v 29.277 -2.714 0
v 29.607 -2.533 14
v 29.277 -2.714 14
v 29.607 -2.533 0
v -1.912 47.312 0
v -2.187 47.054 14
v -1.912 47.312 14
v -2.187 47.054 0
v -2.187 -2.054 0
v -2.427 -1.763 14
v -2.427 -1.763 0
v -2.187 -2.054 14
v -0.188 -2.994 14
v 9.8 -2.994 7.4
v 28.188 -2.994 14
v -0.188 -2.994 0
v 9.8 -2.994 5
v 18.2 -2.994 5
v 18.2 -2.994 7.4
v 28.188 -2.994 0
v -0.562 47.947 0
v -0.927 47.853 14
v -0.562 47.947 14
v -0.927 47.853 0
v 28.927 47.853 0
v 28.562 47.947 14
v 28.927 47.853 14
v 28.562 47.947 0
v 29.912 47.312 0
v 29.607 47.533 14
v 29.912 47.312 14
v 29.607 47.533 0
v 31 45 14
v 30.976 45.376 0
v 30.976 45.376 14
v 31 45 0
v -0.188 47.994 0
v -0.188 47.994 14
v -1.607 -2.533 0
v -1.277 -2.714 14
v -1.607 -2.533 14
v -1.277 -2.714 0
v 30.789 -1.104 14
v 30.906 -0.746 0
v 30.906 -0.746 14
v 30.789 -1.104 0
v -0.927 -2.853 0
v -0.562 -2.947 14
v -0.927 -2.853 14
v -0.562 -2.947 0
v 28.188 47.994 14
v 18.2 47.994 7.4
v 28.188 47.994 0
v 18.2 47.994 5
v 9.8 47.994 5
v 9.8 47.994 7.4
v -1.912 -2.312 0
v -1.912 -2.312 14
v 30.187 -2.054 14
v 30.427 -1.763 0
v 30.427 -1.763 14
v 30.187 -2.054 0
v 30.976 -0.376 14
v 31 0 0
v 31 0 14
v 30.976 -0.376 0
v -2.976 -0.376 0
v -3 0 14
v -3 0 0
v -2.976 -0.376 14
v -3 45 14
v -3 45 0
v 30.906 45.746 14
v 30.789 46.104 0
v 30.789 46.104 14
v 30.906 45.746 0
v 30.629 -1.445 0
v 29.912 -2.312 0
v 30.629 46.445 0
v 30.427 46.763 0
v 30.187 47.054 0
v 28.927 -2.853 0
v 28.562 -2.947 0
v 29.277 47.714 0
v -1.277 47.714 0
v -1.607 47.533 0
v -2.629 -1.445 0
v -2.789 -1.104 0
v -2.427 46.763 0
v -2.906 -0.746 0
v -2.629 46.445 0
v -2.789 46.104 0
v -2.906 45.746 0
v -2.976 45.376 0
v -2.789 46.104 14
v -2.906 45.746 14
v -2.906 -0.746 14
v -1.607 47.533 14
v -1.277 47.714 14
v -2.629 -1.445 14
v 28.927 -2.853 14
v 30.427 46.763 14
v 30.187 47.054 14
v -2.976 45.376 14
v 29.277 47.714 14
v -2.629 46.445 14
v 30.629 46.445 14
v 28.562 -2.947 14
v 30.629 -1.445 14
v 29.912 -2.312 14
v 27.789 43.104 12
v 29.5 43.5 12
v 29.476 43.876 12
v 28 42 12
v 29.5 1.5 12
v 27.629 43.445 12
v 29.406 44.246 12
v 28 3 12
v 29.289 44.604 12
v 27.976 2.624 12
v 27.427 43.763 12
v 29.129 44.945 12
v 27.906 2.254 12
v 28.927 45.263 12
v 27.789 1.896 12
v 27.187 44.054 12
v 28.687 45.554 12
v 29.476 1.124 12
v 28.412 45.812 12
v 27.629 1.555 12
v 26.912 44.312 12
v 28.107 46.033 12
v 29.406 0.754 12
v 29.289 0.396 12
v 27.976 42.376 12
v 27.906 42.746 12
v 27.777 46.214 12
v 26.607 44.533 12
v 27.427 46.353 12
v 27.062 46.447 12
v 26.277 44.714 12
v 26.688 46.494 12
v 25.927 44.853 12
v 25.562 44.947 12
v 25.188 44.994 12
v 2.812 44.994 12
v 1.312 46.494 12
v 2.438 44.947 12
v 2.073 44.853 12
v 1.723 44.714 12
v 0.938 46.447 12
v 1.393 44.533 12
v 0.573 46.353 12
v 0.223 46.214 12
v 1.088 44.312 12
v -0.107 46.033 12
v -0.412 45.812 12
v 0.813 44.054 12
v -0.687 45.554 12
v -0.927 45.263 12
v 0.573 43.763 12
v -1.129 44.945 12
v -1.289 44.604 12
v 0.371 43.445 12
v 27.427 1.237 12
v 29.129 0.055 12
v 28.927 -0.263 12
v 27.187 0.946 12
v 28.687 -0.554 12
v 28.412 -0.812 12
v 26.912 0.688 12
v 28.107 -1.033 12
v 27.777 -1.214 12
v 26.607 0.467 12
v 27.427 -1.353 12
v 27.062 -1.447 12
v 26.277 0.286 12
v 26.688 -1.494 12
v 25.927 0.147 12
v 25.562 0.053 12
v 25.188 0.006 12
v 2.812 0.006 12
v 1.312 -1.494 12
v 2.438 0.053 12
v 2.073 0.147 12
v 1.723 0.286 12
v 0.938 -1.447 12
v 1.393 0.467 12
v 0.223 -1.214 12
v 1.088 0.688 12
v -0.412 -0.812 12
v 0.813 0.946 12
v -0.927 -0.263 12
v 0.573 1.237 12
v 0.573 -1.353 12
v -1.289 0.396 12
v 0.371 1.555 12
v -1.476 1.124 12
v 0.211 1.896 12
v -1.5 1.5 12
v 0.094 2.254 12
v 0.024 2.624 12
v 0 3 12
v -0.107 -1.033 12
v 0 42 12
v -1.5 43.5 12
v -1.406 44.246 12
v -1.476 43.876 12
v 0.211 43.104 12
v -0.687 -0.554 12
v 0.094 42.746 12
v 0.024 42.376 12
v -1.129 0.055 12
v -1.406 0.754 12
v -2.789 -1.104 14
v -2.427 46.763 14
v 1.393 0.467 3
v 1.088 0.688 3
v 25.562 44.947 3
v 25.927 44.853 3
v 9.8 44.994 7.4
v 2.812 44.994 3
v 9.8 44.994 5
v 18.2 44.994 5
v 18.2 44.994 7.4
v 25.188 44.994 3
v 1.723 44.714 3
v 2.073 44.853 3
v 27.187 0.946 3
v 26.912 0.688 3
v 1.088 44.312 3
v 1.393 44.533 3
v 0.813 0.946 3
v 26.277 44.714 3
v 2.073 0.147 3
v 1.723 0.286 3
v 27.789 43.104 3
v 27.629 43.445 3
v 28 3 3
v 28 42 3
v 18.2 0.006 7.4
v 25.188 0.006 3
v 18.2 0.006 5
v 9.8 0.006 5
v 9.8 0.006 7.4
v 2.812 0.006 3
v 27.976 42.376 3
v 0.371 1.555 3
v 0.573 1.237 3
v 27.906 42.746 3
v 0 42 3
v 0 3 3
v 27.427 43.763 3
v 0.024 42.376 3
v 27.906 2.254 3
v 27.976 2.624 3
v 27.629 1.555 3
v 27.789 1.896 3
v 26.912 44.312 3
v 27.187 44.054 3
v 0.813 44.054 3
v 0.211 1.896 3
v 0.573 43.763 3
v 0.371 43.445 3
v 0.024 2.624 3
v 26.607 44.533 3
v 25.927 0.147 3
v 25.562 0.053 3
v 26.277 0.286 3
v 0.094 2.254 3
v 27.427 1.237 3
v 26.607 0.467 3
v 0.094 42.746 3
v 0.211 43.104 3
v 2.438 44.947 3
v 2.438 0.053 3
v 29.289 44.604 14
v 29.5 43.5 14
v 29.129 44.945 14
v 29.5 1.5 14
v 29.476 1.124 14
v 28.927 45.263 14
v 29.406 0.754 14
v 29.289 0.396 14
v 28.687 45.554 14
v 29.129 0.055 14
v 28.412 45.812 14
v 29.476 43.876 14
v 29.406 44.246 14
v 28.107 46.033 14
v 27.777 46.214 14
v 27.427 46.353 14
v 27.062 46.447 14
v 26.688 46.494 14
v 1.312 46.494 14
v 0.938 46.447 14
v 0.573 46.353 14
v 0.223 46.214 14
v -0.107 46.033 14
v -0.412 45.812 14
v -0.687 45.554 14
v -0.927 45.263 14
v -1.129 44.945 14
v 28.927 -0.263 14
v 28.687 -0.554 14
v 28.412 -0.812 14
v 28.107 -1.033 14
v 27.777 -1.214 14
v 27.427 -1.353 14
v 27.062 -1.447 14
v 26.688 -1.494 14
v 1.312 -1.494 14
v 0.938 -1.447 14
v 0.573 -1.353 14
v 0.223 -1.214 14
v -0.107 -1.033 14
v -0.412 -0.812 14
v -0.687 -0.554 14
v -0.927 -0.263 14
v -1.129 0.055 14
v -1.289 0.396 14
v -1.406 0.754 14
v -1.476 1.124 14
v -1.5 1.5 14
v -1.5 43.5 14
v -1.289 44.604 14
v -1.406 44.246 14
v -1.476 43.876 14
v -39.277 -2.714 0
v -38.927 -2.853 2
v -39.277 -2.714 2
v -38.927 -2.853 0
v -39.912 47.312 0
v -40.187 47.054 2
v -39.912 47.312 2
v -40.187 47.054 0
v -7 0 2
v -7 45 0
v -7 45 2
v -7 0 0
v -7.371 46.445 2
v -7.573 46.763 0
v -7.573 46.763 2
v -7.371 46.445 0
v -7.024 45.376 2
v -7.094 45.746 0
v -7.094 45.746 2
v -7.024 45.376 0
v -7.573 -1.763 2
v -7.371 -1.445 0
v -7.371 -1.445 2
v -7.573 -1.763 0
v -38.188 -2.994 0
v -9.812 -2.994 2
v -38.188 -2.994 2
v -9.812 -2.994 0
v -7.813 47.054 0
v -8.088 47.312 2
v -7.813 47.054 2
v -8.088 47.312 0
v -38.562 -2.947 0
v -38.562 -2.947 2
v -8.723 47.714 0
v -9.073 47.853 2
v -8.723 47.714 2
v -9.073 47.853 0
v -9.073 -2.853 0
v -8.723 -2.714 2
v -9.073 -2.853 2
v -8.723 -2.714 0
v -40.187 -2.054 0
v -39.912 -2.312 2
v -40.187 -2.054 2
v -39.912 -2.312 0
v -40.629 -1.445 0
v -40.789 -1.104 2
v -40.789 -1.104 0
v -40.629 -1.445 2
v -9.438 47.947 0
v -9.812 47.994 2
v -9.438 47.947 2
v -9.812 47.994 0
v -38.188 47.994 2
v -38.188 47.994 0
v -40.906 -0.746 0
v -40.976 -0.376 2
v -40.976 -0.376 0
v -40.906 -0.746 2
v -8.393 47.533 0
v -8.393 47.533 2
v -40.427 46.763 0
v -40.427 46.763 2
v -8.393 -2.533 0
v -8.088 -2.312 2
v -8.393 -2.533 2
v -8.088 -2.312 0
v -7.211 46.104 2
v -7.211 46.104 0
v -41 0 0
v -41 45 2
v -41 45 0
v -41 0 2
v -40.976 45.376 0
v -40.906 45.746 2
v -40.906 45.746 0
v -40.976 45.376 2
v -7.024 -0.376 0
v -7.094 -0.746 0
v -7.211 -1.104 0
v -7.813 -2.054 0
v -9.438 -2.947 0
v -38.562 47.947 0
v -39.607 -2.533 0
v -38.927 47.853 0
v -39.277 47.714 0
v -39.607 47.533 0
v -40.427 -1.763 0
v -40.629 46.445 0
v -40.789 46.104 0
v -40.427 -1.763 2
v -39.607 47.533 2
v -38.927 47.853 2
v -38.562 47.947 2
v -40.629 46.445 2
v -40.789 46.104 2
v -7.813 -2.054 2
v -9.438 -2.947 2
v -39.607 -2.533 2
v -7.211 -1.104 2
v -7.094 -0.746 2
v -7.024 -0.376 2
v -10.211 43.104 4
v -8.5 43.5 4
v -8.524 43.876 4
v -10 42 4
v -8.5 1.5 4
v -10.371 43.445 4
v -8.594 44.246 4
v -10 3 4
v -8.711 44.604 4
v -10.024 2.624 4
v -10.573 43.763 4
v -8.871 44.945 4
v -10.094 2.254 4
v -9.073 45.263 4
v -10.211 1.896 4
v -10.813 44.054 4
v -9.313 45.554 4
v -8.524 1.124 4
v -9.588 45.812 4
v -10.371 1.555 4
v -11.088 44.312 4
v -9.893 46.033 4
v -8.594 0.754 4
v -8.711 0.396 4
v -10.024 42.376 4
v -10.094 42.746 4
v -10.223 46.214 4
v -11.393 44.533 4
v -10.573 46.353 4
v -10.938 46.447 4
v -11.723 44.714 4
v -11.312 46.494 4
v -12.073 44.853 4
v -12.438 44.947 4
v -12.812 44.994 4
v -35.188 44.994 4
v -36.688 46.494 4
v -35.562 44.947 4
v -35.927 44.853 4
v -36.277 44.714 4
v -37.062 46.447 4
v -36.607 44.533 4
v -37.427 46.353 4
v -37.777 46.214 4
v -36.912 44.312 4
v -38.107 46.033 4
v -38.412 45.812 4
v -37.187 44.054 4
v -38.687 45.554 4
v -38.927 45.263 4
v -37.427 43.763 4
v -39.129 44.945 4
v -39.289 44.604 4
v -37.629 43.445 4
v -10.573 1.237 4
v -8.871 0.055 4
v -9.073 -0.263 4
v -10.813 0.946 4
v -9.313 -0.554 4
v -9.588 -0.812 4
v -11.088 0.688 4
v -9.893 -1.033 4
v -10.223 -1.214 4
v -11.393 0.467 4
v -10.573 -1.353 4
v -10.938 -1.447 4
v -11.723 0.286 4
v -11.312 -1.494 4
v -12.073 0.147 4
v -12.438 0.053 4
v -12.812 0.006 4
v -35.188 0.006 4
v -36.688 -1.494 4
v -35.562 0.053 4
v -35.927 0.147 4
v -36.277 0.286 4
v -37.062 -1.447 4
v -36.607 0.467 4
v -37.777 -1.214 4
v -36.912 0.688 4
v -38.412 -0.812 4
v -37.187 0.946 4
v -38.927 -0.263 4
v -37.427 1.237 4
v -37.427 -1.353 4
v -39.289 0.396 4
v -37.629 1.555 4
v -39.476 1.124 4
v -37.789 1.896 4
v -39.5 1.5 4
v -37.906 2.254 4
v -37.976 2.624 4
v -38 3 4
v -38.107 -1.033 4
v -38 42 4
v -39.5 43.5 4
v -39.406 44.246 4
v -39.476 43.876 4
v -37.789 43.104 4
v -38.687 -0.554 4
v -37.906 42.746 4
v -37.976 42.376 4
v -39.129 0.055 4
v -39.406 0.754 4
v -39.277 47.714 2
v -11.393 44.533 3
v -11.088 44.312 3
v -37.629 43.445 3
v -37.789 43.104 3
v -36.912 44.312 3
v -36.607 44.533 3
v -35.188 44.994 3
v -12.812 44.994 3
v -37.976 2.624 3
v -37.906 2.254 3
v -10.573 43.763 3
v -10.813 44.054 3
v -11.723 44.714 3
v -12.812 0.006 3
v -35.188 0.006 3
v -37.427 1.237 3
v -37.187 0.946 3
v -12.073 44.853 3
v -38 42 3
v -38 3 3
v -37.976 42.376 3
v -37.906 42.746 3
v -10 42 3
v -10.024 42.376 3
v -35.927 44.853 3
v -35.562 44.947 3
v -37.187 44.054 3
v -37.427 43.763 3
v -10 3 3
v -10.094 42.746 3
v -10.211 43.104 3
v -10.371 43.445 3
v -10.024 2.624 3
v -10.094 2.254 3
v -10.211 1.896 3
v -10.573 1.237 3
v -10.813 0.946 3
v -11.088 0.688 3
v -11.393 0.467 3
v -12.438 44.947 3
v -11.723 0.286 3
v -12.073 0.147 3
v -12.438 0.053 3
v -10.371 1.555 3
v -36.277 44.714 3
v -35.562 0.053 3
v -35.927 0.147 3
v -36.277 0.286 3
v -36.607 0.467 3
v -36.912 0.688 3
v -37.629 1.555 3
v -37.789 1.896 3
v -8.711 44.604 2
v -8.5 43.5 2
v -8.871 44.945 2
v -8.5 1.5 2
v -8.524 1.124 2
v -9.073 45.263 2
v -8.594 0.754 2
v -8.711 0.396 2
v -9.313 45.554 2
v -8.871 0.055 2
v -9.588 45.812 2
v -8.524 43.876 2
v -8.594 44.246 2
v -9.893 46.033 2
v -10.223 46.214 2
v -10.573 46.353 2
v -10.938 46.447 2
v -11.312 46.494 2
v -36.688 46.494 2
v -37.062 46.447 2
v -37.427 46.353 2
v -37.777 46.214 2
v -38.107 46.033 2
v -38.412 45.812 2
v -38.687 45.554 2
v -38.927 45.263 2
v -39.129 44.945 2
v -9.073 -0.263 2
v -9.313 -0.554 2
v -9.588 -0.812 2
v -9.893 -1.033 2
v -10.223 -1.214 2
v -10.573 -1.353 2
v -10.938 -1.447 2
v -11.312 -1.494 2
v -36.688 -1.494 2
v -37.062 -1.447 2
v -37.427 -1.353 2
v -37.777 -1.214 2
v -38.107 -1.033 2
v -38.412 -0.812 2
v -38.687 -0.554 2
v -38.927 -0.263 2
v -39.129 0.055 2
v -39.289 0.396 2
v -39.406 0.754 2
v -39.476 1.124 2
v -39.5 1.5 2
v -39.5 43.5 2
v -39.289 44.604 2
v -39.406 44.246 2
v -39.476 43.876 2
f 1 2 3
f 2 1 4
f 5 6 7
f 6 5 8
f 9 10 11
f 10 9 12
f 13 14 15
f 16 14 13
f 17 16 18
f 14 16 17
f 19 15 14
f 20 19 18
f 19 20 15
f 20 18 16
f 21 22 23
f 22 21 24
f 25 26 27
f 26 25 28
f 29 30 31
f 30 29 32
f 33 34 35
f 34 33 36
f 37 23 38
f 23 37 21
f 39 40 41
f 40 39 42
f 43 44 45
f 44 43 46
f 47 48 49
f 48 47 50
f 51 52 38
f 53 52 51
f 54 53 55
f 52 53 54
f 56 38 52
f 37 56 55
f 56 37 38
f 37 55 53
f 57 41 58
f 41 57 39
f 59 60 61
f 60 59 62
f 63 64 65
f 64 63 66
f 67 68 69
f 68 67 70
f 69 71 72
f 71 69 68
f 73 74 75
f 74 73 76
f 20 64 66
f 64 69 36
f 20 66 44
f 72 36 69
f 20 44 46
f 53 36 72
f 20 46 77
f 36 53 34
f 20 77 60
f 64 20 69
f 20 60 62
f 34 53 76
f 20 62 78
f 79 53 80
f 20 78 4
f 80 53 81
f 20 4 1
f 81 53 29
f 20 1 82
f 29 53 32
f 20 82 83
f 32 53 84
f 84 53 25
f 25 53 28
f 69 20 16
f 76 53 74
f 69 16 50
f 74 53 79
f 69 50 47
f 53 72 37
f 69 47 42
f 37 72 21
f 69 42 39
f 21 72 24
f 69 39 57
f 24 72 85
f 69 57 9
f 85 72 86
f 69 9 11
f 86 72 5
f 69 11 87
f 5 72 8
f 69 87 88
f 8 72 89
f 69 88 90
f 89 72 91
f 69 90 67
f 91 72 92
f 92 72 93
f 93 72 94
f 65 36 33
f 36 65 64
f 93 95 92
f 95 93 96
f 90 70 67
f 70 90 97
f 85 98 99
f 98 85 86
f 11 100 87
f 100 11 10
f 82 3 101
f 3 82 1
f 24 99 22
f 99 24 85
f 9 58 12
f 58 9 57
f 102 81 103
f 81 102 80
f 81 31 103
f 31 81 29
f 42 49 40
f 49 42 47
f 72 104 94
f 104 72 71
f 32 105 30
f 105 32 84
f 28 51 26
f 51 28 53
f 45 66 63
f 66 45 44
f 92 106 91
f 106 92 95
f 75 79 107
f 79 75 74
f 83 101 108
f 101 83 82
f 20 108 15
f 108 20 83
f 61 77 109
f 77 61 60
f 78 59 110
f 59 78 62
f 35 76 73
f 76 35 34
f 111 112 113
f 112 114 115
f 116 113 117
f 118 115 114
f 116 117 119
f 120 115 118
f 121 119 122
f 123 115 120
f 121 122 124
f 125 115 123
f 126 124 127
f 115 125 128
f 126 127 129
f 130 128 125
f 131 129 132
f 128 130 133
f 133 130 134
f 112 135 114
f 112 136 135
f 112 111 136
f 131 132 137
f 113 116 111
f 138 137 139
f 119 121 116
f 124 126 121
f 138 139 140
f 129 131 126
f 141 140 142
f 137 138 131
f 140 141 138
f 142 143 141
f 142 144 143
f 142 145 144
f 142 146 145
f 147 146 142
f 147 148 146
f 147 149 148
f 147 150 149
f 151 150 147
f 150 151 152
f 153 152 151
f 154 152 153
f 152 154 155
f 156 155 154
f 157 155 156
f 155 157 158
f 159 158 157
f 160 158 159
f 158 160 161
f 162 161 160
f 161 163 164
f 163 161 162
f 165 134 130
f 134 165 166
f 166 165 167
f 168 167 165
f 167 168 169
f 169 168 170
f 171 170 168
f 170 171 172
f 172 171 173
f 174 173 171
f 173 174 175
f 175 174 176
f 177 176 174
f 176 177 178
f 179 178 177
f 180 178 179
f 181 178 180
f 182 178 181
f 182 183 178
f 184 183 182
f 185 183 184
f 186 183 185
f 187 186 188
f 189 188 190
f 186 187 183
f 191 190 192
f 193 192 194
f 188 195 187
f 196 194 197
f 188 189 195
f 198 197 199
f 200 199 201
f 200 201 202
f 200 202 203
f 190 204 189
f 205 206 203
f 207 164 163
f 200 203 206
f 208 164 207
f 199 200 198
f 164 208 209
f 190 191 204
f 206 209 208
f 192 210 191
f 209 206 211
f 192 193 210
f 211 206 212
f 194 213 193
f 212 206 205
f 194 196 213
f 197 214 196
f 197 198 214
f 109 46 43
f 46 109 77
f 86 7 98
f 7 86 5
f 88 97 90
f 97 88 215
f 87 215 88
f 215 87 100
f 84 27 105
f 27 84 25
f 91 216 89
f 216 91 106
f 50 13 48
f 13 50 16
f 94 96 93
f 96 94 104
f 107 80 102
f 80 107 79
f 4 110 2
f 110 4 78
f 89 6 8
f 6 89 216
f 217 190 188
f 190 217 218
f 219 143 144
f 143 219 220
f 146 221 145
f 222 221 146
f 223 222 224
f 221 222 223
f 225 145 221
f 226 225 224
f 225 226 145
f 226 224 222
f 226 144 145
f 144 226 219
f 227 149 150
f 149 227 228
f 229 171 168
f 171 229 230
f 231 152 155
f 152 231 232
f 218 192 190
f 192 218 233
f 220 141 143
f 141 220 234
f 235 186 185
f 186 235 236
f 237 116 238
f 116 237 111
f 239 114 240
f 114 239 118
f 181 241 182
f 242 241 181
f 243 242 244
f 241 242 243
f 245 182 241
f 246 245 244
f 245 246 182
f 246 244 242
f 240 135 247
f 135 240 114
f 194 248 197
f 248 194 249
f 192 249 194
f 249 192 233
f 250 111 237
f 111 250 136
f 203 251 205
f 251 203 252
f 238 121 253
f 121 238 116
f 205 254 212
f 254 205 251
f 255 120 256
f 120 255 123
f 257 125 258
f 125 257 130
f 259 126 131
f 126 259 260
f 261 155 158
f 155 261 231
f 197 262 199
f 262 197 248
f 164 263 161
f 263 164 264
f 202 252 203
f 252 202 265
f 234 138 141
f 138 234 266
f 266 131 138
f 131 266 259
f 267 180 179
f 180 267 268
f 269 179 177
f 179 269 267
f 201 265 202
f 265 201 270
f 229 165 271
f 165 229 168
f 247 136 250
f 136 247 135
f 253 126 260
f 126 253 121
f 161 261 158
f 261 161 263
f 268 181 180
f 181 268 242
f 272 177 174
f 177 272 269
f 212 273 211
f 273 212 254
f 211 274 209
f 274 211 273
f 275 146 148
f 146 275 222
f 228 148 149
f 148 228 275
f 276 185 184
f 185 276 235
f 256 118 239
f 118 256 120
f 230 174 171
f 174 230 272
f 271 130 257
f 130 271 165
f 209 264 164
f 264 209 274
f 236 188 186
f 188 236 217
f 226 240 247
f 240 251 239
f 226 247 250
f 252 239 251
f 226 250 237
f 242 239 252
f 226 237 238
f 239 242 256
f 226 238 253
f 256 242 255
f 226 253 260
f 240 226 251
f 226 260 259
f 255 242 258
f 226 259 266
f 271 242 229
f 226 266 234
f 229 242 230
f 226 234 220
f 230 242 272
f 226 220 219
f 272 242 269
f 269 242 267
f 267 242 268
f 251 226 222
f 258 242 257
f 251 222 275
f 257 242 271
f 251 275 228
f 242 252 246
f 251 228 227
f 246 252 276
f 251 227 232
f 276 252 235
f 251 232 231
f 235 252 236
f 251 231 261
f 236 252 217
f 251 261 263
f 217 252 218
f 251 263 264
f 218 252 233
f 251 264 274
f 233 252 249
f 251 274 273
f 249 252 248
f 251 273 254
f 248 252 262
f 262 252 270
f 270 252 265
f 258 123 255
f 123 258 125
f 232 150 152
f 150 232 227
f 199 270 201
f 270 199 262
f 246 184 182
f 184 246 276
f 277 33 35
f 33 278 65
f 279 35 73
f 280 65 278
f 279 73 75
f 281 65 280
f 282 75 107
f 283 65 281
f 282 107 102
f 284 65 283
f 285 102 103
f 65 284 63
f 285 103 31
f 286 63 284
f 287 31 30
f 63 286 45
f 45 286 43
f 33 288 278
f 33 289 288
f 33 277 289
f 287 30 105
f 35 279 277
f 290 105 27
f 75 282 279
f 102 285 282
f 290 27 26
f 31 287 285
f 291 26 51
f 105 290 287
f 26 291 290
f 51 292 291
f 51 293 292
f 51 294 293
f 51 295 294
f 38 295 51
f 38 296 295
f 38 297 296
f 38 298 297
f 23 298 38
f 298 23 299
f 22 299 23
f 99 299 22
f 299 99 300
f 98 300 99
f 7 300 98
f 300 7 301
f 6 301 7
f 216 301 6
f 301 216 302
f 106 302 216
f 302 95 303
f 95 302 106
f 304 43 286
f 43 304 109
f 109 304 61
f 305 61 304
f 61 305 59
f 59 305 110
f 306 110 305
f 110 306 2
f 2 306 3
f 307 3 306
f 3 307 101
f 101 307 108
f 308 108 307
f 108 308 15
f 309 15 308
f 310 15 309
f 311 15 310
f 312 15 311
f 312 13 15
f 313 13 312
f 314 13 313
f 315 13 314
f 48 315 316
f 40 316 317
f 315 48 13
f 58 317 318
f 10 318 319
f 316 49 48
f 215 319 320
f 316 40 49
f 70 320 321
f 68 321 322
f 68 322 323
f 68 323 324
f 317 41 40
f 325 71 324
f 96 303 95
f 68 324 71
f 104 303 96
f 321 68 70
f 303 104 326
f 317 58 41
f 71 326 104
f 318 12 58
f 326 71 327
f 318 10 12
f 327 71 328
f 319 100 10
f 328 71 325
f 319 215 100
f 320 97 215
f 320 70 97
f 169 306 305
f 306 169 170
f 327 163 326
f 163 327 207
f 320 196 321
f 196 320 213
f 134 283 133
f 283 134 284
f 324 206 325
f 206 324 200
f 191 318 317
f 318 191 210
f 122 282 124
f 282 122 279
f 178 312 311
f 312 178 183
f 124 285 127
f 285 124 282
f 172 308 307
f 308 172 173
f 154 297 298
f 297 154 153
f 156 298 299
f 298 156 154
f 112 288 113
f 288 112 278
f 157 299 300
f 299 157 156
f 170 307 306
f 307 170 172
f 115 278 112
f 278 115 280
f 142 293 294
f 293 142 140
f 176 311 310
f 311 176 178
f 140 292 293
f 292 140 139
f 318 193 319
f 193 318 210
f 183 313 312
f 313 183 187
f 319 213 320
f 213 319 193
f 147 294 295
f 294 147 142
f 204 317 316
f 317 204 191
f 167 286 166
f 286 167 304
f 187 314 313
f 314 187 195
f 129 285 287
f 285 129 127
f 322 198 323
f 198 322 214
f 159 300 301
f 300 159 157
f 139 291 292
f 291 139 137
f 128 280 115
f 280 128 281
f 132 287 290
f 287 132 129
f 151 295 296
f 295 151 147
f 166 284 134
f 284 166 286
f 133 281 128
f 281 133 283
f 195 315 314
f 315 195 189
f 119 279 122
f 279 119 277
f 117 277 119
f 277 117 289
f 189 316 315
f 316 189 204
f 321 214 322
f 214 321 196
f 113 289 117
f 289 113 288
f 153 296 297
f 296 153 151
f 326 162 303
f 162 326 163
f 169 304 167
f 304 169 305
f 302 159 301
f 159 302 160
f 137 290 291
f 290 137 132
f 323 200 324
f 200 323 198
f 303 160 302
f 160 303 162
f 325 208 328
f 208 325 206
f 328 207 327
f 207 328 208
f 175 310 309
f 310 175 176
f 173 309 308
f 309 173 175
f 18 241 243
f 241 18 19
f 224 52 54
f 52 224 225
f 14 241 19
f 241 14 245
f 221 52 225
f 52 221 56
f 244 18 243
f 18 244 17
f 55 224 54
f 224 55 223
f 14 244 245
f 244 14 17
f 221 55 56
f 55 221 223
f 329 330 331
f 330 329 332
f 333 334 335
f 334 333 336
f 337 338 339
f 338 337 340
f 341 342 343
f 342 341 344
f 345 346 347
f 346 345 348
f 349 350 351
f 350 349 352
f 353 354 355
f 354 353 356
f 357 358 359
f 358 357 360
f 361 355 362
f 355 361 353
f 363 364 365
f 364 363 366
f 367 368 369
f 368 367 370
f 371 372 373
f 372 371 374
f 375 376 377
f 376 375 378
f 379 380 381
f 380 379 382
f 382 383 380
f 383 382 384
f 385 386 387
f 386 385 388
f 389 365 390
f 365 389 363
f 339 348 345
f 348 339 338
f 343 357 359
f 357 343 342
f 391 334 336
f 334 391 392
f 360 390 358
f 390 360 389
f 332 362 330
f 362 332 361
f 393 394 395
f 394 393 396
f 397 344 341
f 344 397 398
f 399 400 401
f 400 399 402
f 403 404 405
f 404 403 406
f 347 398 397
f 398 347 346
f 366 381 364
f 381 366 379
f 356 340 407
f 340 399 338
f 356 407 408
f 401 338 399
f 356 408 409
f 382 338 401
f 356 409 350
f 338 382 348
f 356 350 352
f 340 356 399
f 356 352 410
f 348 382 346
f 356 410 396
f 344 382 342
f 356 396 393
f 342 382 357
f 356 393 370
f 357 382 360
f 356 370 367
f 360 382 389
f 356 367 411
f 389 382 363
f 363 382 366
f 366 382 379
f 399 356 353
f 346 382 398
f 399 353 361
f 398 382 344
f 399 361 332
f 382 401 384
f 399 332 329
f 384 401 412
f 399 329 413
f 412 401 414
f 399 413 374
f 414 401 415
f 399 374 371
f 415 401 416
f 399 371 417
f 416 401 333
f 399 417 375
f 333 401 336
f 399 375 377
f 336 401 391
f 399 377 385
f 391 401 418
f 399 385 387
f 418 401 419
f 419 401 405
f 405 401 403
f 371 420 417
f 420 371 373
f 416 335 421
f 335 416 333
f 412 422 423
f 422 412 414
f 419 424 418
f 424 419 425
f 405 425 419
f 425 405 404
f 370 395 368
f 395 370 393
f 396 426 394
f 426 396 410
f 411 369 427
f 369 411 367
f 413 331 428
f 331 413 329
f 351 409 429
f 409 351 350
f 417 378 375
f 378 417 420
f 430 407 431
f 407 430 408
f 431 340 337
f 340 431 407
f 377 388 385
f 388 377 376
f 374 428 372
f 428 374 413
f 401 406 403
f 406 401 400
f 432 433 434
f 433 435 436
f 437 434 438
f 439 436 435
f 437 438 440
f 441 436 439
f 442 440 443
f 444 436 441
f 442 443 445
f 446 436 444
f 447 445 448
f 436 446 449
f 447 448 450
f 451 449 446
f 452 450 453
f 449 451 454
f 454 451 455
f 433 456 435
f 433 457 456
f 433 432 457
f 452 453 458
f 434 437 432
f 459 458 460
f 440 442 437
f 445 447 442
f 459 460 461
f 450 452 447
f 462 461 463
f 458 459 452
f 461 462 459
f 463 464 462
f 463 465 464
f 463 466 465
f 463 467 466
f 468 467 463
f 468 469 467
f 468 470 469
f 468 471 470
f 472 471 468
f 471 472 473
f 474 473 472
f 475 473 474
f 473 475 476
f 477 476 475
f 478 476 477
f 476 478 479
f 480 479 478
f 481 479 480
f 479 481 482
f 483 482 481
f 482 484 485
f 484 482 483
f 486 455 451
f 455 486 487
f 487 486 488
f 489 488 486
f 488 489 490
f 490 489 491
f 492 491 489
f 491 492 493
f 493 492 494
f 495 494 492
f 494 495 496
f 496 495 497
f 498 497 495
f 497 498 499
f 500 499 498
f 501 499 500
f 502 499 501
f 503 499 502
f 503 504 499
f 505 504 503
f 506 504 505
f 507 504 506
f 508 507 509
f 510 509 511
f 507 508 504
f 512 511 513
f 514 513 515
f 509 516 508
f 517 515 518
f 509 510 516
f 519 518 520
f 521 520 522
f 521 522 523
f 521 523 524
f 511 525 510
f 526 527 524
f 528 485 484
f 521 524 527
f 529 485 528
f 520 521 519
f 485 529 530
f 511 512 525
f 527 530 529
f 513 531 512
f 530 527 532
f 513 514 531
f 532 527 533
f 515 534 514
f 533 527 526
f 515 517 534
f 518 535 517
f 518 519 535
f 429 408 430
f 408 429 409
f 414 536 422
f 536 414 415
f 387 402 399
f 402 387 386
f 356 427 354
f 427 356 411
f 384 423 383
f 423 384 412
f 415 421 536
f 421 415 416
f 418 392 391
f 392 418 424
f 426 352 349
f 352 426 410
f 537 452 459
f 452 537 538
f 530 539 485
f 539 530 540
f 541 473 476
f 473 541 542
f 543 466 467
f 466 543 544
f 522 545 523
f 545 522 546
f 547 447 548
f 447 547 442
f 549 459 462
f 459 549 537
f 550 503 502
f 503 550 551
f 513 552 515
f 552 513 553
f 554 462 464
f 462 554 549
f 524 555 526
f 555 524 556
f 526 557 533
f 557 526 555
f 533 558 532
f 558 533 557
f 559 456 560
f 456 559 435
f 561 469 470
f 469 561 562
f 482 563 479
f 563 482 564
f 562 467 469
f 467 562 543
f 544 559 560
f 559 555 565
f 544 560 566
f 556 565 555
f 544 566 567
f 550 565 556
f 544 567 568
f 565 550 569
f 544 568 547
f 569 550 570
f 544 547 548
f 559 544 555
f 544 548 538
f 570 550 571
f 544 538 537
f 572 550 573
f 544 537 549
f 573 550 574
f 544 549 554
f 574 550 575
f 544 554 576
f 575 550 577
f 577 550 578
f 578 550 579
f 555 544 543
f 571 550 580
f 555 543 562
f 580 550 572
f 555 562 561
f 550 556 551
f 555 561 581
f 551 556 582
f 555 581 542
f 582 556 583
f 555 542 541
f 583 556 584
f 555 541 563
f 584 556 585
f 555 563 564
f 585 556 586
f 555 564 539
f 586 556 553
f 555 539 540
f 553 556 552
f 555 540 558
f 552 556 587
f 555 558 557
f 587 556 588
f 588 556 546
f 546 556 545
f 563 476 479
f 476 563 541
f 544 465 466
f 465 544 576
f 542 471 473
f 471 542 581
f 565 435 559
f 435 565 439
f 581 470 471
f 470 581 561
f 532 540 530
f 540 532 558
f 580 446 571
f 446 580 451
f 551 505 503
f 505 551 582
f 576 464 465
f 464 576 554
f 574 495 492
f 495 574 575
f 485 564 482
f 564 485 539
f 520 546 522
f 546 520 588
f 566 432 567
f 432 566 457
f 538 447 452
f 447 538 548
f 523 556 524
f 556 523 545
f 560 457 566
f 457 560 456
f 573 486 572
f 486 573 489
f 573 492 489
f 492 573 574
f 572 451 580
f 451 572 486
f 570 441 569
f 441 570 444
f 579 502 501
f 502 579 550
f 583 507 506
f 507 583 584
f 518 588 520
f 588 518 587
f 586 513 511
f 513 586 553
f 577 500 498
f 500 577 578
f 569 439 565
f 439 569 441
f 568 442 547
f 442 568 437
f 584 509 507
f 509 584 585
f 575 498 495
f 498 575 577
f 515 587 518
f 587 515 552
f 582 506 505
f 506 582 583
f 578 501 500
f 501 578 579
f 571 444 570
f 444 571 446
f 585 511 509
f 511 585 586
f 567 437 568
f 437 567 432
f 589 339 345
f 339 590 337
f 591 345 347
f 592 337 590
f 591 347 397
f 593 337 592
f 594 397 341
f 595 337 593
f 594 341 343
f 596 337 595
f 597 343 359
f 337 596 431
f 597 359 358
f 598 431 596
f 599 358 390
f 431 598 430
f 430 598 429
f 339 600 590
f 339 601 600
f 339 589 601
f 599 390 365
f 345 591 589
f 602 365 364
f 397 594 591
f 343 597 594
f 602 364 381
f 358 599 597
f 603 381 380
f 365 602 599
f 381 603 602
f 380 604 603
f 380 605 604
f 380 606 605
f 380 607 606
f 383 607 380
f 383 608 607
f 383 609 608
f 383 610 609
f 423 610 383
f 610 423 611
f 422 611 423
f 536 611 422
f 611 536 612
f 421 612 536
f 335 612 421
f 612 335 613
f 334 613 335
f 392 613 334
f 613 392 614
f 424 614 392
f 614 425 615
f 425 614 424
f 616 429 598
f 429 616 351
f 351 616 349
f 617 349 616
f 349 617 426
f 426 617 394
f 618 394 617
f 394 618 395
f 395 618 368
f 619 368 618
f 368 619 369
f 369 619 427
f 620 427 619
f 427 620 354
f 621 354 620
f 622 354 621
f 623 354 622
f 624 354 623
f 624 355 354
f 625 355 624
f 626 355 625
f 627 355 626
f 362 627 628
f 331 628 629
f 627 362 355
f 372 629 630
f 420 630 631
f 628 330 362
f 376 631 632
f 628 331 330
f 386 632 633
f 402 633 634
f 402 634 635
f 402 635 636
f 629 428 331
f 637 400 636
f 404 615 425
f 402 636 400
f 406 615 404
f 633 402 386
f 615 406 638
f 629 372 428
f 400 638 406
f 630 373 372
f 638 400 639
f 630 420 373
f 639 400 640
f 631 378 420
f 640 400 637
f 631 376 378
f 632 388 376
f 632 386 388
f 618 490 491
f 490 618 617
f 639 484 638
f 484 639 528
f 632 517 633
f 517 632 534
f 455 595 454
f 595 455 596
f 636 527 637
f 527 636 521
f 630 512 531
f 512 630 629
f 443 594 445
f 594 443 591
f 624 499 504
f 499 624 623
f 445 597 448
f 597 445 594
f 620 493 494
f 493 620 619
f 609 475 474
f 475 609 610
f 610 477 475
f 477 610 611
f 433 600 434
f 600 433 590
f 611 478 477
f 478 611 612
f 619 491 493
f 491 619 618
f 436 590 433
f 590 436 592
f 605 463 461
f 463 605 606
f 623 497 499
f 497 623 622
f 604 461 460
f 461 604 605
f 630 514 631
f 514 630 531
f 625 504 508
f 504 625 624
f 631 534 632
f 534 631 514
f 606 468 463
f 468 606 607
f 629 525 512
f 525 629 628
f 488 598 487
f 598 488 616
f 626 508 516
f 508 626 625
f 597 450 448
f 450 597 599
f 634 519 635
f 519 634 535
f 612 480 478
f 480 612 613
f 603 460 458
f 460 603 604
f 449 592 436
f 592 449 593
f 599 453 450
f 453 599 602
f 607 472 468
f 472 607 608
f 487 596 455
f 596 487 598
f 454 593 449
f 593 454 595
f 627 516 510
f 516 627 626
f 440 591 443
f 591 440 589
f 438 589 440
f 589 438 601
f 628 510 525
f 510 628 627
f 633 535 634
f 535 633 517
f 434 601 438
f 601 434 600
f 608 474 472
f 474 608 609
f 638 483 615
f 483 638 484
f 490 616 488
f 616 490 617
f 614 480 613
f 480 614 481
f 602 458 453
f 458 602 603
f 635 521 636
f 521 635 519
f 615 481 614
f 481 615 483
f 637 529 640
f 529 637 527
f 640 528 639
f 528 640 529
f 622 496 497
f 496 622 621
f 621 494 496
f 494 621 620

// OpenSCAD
$fn = 50;

// variables
case_width = 28;
case_depth = 45;
case_height = 10;
lid_height = 2;
border = 3;


module base(w,d,h) {
    minkowski() {
        cube([w,d,h]);
        cylinder(r=3, h=3);
    }
}

// case
difference() {
    union(){
        difference() {
            base(case_width,case_depth,case_height-lid_height/2);
            translate([border,border,border])
            base(case_width-(border*2),case_depth-(border*2),case_height-lid_height/2);
        }
        difference() {
            translate([0,0,case_height-lid_height/2])
            base(case_width,case_depth,2);
            translate([border-(border/2),border-(border/2),case_height-(lid_height/2)-2])
            base(case_width-(border*2)+border,case_depth-(border*2)+border, lid_height+4);
        }
    }
    union(){
        // usb-c
        translate([case_width/2-4.2,-5,border+2])
        cube([8.4,120,2.4]);
        /* todo loadcell
        translate([case_width/2-3,-5,border+2])
        cylinder(6,3,3);*/
    }
}

// lid
translate([-case_width-10,0,0])
difference() {
    difference() {
        base(case_width,case_depth,lid_height/2);
        translate([border,border,border])
        base(case_width-(border*2),case_depth-(border*2),lid_height+4);
    }
    difference() {
     
        translate([-1,-1,lid_height])
        base(case_width+2,case_depth+2,lid_height/2+4);
        translate([border/2,border/2,0])
        base(case_width-(border*2)+border,case_depth-(border*2)+border, lid_height+4);
  }
}
